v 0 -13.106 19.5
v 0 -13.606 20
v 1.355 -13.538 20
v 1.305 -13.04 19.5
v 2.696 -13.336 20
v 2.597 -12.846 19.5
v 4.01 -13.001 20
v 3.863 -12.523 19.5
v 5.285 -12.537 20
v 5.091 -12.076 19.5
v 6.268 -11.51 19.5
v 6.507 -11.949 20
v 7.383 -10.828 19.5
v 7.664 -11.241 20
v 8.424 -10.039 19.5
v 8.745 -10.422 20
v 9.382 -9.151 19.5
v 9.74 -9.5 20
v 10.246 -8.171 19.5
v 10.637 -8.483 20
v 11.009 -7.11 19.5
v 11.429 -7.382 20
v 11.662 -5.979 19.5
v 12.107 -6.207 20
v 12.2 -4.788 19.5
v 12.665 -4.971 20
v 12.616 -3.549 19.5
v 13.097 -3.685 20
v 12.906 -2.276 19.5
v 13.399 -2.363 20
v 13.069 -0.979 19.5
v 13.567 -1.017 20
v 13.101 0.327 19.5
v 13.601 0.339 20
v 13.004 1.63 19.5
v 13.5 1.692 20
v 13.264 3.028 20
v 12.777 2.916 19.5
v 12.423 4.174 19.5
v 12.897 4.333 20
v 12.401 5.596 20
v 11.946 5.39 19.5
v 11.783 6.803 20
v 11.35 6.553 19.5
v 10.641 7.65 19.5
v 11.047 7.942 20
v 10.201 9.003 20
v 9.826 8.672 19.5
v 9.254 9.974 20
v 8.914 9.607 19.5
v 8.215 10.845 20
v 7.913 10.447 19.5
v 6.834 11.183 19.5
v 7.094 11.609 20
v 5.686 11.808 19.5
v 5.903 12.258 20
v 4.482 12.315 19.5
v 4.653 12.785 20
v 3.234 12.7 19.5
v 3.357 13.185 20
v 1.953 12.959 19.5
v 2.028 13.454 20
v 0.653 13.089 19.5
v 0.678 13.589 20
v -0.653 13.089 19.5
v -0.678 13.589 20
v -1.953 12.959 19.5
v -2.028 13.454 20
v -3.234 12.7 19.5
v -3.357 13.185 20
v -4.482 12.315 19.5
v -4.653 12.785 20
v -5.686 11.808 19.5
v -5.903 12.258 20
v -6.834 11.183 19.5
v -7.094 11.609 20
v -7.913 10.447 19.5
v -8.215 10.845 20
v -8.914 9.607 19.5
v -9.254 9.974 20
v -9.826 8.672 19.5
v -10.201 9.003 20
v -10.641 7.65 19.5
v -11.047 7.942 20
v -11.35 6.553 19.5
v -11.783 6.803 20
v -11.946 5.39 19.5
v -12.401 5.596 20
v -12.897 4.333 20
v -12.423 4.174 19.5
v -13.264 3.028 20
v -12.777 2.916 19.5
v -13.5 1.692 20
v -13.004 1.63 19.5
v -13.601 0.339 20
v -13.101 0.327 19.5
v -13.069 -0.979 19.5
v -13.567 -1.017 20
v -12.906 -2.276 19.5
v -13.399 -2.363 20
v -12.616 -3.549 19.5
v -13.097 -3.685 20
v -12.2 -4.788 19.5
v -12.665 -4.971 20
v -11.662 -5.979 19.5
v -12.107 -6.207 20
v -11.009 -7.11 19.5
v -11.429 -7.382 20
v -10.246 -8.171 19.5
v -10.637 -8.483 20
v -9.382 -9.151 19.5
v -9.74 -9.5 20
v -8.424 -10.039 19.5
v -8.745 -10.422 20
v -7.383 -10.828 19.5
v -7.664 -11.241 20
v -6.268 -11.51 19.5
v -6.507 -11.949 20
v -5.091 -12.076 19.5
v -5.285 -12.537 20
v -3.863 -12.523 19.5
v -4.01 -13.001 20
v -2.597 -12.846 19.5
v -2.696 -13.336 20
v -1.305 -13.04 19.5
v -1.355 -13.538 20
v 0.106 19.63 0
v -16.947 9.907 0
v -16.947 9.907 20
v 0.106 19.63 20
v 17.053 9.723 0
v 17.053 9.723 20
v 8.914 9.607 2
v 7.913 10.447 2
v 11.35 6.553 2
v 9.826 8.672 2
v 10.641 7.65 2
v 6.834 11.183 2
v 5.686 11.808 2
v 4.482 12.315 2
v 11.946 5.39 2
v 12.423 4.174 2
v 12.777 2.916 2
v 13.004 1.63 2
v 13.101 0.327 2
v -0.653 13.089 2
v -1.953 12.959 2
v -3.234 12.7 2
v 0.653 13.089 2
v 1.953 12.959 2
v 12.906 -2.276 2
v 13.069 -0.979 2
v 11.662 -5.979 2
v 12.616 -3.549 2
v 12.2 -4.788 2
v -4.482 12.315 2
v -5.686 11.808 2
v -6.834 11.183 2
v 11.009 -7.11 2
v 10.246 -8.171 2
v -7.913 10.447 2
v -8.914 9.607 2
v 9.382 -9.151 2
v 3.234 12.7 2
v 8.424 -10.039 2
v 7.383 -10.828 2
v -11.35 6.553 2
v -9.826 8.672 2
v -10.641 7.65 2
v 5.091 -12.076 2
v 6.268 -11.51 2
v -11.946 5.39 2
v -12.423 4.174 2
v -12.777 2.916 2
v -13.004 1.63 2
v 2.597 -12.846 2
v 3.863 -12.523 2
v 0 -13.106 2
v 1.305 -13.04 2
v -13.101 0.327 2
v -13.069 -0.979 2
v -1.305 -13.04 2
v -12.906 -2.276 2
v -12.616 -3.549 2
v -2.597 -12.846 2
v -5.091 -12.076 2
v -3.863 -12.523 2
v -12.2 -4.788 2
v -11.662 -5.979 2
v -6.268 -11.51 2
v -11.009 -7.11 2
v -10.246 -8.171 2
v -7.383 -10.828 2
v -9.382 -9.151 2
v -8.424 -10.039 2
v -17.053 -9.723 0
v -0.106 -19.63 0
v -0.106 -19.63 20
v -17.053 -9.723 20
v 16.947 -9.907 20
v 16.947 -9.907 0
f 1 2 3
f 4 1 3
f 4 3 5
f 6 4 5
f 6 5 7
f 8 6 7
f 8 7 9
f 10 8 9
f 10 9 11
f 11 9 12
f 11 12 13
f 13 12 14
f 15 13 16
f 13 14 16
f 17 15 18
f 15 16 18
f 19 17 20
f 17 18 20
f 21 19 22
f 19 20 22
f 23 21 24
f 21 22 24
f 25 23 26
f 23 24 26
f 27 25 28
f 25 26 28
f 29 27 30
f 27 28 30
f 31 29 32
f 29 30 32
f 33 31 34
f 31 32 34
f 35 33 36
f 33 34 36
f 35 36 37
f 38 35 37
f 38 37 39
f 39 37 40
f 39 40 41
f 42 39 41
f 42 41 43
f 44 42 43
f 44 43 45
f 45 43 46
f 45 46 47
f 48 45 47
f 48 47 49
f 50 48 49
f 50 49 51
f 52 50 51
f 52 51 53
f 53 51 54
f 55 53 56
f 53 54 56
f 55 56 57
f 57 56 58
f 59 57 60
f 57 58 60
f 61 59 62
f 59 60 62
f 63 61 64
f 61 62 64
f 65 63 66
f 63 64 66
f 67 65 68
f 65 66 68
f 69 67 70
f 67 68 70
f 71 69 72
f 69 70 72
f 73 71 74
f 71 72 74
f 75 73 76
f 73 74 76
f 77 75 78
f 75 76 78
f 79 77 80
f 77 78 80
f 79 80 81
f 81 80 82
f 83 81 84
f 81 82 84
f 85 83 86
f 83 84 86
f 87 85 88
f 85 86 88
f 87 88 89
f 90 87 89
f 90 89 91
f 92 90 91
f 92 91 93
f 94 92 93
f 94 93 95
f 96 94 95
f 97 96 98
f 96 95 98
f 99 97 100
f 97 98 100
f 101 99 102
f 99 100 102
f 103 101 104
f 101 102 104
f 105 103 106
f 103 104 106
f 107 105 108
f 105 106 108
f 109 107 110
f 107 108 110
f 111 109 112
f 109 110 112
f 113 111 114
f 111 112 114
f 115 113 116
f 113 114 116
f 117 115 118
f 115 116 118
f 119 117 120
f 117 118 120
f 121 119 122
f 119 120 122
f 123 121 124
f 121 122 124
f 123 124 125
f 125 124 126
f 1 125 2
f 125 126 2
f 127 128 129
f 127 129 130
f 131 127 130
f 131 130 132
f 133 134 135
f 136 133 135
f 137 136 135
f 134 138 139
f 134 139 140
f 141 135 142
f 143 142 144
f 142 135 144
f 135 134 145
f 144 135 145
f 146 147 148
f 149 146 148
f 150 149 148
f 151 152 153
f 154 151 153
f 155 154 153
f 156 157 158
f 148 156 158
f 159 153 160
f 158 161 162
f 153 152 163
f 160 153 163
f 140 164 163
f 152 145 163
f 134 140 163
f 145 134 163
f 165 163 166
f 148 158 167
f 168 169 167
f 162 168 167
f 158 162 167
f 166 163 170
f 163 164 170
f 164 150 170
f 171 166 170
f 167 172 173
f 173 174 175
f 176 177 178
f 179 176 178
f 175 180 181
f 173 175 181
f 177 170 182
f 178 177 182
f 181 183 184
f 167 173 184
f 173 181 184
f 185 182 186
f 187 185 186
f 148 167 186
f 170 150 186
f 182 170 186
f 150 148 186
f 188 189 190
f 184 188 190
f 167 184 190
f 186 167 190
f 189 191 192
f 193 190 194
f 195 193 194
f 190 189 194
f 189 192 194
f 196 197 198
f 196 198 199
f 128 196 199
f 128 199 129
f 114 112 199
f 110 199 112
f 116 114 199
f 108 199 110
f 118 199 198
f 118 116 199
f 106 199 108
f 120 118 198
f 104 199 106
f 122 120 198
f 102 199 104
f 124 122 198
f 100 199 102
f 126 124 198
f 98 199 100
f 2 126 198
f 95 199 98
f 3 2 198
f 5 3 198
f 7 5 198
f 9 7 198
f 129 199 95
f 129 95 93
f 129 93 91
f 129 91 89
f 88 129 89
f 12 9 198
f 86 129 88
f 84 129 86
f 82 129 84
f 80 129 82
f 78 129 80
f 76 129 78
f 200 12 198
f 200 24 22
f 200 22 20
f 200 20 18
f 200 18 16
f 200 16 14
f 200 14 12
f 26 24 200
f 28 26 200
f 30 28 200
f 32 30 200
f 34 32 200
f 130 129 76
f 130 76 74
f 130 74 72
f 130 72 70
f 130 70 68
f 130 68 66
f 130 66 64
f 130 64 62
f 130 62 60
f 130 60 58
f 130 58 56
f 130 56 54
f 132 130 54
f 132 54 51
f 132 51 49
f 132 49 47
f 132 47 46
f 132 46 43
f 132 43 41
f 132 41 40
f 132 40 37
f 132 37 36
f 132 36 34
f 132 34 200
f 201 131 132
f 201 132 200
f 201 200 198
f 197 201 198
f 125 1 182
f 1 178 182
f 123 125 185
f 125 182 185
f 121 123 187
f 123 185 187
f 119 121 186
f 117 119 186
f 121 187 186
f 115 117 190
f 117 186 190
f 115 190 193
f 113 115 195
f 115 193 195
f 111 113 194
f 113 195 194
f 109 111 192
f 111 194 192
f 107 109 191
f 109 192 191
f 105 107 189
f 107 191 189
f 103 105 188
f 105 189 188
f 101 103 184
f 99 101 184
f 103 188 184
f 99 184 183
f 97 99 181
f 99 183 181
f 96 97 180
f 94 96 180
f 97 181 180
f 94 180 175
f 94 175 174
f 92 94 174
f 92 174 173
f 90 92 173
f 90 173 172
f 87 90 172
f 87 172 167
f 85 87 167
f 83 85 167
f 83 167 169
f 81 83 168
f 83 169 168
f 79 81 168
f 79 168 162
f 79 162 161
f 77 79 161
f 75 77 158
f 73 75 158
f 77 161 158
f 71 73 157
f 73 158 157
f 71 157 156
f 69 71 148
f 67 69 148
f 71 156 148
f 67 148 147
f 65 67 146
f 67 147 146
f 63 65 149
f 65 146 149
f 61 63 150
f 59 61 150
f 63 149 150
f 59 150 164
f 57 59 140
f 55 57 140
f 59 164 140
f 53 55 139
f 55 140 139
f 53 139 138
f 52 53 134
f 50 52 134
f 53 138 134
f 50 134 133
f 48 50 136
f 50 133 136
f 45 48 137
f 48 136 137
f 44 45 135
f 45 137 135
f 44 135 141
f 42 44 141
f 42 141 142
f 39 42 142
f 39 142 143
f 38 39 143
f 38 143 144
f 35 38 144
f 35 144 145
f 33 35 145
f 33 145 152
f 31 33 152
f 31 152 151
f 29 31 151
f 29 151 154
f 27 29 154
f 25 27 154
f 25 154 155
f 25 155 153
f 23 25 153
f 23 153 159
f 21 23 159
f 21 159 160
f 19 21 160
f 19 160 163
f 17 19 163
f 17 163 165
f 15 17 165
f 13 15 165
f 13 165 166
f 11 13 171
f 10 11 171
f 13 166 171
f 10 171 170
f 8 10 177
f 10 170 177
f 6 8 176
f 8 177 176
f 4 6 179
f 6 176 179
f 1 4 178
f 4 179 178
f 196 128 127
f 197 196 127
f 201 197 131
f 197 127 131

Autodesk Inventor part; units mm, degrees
ref_plane "YZ Plane" through (0, 0, 0) normal (1, 0, 0) x (0, 1, 0)
ref_plane "XZ Plane" through (0, 0, 0) normal (0, 1, 0) x (-1, 0, 0)
ref_plane "XY Plane" through (0, 0, 0) normal (0, 0, 1) x (1, 0, 0)
sketch "Skizze1" plane through (0, 0, 0) normal (0, 0, 1) x (1, 0, 0)
  line L0 (-23.874, 0) -> (23.874, 0) projected
  line L1 (0, -27.4815) -> (0, 27.4815) projected
  line L2 (-16.9467, 9.9068) -> (0.1062, 19.6296)
  line L3 (0.1062, 19.6296) -> (17.0529, 9.7228)
  line L4 (17.0529, 9.7228) -> (16.9467, -9.9068)
  line L5 (16.9467, -9.9068) -> (-0.1062, -19.6296)
  line L6 (-0.1062, -19.6296) -> (-17.0529, -9.7228)
  line L7 (-17.0529, -9.7228) -> (-16.9467, 9.9068)
  circle A0 centre (0, 0) radius 15
  dimension "d0" = 30
  dimension "d1" = 17
extrude "Extrusion1" add sketch "Skizze1" along normal blind 20
sketch "Skizze3" plane through (0, 0, 20) normal (0, 0, 1) x (1, 0, 0)
  point P0 (0, 0)
hole "Bohrung1" at (0, 0, 20) direction (0, 0, -1) diameter 26.211 depth 18 thread size "M30x3.5" class "6H" standard "ISO Metric profile"
chamfer "Fase1" distance 0.5 angle 45 1 edges at (0, 13.1055, 20)
properties part number "VerteilerLuft2"
